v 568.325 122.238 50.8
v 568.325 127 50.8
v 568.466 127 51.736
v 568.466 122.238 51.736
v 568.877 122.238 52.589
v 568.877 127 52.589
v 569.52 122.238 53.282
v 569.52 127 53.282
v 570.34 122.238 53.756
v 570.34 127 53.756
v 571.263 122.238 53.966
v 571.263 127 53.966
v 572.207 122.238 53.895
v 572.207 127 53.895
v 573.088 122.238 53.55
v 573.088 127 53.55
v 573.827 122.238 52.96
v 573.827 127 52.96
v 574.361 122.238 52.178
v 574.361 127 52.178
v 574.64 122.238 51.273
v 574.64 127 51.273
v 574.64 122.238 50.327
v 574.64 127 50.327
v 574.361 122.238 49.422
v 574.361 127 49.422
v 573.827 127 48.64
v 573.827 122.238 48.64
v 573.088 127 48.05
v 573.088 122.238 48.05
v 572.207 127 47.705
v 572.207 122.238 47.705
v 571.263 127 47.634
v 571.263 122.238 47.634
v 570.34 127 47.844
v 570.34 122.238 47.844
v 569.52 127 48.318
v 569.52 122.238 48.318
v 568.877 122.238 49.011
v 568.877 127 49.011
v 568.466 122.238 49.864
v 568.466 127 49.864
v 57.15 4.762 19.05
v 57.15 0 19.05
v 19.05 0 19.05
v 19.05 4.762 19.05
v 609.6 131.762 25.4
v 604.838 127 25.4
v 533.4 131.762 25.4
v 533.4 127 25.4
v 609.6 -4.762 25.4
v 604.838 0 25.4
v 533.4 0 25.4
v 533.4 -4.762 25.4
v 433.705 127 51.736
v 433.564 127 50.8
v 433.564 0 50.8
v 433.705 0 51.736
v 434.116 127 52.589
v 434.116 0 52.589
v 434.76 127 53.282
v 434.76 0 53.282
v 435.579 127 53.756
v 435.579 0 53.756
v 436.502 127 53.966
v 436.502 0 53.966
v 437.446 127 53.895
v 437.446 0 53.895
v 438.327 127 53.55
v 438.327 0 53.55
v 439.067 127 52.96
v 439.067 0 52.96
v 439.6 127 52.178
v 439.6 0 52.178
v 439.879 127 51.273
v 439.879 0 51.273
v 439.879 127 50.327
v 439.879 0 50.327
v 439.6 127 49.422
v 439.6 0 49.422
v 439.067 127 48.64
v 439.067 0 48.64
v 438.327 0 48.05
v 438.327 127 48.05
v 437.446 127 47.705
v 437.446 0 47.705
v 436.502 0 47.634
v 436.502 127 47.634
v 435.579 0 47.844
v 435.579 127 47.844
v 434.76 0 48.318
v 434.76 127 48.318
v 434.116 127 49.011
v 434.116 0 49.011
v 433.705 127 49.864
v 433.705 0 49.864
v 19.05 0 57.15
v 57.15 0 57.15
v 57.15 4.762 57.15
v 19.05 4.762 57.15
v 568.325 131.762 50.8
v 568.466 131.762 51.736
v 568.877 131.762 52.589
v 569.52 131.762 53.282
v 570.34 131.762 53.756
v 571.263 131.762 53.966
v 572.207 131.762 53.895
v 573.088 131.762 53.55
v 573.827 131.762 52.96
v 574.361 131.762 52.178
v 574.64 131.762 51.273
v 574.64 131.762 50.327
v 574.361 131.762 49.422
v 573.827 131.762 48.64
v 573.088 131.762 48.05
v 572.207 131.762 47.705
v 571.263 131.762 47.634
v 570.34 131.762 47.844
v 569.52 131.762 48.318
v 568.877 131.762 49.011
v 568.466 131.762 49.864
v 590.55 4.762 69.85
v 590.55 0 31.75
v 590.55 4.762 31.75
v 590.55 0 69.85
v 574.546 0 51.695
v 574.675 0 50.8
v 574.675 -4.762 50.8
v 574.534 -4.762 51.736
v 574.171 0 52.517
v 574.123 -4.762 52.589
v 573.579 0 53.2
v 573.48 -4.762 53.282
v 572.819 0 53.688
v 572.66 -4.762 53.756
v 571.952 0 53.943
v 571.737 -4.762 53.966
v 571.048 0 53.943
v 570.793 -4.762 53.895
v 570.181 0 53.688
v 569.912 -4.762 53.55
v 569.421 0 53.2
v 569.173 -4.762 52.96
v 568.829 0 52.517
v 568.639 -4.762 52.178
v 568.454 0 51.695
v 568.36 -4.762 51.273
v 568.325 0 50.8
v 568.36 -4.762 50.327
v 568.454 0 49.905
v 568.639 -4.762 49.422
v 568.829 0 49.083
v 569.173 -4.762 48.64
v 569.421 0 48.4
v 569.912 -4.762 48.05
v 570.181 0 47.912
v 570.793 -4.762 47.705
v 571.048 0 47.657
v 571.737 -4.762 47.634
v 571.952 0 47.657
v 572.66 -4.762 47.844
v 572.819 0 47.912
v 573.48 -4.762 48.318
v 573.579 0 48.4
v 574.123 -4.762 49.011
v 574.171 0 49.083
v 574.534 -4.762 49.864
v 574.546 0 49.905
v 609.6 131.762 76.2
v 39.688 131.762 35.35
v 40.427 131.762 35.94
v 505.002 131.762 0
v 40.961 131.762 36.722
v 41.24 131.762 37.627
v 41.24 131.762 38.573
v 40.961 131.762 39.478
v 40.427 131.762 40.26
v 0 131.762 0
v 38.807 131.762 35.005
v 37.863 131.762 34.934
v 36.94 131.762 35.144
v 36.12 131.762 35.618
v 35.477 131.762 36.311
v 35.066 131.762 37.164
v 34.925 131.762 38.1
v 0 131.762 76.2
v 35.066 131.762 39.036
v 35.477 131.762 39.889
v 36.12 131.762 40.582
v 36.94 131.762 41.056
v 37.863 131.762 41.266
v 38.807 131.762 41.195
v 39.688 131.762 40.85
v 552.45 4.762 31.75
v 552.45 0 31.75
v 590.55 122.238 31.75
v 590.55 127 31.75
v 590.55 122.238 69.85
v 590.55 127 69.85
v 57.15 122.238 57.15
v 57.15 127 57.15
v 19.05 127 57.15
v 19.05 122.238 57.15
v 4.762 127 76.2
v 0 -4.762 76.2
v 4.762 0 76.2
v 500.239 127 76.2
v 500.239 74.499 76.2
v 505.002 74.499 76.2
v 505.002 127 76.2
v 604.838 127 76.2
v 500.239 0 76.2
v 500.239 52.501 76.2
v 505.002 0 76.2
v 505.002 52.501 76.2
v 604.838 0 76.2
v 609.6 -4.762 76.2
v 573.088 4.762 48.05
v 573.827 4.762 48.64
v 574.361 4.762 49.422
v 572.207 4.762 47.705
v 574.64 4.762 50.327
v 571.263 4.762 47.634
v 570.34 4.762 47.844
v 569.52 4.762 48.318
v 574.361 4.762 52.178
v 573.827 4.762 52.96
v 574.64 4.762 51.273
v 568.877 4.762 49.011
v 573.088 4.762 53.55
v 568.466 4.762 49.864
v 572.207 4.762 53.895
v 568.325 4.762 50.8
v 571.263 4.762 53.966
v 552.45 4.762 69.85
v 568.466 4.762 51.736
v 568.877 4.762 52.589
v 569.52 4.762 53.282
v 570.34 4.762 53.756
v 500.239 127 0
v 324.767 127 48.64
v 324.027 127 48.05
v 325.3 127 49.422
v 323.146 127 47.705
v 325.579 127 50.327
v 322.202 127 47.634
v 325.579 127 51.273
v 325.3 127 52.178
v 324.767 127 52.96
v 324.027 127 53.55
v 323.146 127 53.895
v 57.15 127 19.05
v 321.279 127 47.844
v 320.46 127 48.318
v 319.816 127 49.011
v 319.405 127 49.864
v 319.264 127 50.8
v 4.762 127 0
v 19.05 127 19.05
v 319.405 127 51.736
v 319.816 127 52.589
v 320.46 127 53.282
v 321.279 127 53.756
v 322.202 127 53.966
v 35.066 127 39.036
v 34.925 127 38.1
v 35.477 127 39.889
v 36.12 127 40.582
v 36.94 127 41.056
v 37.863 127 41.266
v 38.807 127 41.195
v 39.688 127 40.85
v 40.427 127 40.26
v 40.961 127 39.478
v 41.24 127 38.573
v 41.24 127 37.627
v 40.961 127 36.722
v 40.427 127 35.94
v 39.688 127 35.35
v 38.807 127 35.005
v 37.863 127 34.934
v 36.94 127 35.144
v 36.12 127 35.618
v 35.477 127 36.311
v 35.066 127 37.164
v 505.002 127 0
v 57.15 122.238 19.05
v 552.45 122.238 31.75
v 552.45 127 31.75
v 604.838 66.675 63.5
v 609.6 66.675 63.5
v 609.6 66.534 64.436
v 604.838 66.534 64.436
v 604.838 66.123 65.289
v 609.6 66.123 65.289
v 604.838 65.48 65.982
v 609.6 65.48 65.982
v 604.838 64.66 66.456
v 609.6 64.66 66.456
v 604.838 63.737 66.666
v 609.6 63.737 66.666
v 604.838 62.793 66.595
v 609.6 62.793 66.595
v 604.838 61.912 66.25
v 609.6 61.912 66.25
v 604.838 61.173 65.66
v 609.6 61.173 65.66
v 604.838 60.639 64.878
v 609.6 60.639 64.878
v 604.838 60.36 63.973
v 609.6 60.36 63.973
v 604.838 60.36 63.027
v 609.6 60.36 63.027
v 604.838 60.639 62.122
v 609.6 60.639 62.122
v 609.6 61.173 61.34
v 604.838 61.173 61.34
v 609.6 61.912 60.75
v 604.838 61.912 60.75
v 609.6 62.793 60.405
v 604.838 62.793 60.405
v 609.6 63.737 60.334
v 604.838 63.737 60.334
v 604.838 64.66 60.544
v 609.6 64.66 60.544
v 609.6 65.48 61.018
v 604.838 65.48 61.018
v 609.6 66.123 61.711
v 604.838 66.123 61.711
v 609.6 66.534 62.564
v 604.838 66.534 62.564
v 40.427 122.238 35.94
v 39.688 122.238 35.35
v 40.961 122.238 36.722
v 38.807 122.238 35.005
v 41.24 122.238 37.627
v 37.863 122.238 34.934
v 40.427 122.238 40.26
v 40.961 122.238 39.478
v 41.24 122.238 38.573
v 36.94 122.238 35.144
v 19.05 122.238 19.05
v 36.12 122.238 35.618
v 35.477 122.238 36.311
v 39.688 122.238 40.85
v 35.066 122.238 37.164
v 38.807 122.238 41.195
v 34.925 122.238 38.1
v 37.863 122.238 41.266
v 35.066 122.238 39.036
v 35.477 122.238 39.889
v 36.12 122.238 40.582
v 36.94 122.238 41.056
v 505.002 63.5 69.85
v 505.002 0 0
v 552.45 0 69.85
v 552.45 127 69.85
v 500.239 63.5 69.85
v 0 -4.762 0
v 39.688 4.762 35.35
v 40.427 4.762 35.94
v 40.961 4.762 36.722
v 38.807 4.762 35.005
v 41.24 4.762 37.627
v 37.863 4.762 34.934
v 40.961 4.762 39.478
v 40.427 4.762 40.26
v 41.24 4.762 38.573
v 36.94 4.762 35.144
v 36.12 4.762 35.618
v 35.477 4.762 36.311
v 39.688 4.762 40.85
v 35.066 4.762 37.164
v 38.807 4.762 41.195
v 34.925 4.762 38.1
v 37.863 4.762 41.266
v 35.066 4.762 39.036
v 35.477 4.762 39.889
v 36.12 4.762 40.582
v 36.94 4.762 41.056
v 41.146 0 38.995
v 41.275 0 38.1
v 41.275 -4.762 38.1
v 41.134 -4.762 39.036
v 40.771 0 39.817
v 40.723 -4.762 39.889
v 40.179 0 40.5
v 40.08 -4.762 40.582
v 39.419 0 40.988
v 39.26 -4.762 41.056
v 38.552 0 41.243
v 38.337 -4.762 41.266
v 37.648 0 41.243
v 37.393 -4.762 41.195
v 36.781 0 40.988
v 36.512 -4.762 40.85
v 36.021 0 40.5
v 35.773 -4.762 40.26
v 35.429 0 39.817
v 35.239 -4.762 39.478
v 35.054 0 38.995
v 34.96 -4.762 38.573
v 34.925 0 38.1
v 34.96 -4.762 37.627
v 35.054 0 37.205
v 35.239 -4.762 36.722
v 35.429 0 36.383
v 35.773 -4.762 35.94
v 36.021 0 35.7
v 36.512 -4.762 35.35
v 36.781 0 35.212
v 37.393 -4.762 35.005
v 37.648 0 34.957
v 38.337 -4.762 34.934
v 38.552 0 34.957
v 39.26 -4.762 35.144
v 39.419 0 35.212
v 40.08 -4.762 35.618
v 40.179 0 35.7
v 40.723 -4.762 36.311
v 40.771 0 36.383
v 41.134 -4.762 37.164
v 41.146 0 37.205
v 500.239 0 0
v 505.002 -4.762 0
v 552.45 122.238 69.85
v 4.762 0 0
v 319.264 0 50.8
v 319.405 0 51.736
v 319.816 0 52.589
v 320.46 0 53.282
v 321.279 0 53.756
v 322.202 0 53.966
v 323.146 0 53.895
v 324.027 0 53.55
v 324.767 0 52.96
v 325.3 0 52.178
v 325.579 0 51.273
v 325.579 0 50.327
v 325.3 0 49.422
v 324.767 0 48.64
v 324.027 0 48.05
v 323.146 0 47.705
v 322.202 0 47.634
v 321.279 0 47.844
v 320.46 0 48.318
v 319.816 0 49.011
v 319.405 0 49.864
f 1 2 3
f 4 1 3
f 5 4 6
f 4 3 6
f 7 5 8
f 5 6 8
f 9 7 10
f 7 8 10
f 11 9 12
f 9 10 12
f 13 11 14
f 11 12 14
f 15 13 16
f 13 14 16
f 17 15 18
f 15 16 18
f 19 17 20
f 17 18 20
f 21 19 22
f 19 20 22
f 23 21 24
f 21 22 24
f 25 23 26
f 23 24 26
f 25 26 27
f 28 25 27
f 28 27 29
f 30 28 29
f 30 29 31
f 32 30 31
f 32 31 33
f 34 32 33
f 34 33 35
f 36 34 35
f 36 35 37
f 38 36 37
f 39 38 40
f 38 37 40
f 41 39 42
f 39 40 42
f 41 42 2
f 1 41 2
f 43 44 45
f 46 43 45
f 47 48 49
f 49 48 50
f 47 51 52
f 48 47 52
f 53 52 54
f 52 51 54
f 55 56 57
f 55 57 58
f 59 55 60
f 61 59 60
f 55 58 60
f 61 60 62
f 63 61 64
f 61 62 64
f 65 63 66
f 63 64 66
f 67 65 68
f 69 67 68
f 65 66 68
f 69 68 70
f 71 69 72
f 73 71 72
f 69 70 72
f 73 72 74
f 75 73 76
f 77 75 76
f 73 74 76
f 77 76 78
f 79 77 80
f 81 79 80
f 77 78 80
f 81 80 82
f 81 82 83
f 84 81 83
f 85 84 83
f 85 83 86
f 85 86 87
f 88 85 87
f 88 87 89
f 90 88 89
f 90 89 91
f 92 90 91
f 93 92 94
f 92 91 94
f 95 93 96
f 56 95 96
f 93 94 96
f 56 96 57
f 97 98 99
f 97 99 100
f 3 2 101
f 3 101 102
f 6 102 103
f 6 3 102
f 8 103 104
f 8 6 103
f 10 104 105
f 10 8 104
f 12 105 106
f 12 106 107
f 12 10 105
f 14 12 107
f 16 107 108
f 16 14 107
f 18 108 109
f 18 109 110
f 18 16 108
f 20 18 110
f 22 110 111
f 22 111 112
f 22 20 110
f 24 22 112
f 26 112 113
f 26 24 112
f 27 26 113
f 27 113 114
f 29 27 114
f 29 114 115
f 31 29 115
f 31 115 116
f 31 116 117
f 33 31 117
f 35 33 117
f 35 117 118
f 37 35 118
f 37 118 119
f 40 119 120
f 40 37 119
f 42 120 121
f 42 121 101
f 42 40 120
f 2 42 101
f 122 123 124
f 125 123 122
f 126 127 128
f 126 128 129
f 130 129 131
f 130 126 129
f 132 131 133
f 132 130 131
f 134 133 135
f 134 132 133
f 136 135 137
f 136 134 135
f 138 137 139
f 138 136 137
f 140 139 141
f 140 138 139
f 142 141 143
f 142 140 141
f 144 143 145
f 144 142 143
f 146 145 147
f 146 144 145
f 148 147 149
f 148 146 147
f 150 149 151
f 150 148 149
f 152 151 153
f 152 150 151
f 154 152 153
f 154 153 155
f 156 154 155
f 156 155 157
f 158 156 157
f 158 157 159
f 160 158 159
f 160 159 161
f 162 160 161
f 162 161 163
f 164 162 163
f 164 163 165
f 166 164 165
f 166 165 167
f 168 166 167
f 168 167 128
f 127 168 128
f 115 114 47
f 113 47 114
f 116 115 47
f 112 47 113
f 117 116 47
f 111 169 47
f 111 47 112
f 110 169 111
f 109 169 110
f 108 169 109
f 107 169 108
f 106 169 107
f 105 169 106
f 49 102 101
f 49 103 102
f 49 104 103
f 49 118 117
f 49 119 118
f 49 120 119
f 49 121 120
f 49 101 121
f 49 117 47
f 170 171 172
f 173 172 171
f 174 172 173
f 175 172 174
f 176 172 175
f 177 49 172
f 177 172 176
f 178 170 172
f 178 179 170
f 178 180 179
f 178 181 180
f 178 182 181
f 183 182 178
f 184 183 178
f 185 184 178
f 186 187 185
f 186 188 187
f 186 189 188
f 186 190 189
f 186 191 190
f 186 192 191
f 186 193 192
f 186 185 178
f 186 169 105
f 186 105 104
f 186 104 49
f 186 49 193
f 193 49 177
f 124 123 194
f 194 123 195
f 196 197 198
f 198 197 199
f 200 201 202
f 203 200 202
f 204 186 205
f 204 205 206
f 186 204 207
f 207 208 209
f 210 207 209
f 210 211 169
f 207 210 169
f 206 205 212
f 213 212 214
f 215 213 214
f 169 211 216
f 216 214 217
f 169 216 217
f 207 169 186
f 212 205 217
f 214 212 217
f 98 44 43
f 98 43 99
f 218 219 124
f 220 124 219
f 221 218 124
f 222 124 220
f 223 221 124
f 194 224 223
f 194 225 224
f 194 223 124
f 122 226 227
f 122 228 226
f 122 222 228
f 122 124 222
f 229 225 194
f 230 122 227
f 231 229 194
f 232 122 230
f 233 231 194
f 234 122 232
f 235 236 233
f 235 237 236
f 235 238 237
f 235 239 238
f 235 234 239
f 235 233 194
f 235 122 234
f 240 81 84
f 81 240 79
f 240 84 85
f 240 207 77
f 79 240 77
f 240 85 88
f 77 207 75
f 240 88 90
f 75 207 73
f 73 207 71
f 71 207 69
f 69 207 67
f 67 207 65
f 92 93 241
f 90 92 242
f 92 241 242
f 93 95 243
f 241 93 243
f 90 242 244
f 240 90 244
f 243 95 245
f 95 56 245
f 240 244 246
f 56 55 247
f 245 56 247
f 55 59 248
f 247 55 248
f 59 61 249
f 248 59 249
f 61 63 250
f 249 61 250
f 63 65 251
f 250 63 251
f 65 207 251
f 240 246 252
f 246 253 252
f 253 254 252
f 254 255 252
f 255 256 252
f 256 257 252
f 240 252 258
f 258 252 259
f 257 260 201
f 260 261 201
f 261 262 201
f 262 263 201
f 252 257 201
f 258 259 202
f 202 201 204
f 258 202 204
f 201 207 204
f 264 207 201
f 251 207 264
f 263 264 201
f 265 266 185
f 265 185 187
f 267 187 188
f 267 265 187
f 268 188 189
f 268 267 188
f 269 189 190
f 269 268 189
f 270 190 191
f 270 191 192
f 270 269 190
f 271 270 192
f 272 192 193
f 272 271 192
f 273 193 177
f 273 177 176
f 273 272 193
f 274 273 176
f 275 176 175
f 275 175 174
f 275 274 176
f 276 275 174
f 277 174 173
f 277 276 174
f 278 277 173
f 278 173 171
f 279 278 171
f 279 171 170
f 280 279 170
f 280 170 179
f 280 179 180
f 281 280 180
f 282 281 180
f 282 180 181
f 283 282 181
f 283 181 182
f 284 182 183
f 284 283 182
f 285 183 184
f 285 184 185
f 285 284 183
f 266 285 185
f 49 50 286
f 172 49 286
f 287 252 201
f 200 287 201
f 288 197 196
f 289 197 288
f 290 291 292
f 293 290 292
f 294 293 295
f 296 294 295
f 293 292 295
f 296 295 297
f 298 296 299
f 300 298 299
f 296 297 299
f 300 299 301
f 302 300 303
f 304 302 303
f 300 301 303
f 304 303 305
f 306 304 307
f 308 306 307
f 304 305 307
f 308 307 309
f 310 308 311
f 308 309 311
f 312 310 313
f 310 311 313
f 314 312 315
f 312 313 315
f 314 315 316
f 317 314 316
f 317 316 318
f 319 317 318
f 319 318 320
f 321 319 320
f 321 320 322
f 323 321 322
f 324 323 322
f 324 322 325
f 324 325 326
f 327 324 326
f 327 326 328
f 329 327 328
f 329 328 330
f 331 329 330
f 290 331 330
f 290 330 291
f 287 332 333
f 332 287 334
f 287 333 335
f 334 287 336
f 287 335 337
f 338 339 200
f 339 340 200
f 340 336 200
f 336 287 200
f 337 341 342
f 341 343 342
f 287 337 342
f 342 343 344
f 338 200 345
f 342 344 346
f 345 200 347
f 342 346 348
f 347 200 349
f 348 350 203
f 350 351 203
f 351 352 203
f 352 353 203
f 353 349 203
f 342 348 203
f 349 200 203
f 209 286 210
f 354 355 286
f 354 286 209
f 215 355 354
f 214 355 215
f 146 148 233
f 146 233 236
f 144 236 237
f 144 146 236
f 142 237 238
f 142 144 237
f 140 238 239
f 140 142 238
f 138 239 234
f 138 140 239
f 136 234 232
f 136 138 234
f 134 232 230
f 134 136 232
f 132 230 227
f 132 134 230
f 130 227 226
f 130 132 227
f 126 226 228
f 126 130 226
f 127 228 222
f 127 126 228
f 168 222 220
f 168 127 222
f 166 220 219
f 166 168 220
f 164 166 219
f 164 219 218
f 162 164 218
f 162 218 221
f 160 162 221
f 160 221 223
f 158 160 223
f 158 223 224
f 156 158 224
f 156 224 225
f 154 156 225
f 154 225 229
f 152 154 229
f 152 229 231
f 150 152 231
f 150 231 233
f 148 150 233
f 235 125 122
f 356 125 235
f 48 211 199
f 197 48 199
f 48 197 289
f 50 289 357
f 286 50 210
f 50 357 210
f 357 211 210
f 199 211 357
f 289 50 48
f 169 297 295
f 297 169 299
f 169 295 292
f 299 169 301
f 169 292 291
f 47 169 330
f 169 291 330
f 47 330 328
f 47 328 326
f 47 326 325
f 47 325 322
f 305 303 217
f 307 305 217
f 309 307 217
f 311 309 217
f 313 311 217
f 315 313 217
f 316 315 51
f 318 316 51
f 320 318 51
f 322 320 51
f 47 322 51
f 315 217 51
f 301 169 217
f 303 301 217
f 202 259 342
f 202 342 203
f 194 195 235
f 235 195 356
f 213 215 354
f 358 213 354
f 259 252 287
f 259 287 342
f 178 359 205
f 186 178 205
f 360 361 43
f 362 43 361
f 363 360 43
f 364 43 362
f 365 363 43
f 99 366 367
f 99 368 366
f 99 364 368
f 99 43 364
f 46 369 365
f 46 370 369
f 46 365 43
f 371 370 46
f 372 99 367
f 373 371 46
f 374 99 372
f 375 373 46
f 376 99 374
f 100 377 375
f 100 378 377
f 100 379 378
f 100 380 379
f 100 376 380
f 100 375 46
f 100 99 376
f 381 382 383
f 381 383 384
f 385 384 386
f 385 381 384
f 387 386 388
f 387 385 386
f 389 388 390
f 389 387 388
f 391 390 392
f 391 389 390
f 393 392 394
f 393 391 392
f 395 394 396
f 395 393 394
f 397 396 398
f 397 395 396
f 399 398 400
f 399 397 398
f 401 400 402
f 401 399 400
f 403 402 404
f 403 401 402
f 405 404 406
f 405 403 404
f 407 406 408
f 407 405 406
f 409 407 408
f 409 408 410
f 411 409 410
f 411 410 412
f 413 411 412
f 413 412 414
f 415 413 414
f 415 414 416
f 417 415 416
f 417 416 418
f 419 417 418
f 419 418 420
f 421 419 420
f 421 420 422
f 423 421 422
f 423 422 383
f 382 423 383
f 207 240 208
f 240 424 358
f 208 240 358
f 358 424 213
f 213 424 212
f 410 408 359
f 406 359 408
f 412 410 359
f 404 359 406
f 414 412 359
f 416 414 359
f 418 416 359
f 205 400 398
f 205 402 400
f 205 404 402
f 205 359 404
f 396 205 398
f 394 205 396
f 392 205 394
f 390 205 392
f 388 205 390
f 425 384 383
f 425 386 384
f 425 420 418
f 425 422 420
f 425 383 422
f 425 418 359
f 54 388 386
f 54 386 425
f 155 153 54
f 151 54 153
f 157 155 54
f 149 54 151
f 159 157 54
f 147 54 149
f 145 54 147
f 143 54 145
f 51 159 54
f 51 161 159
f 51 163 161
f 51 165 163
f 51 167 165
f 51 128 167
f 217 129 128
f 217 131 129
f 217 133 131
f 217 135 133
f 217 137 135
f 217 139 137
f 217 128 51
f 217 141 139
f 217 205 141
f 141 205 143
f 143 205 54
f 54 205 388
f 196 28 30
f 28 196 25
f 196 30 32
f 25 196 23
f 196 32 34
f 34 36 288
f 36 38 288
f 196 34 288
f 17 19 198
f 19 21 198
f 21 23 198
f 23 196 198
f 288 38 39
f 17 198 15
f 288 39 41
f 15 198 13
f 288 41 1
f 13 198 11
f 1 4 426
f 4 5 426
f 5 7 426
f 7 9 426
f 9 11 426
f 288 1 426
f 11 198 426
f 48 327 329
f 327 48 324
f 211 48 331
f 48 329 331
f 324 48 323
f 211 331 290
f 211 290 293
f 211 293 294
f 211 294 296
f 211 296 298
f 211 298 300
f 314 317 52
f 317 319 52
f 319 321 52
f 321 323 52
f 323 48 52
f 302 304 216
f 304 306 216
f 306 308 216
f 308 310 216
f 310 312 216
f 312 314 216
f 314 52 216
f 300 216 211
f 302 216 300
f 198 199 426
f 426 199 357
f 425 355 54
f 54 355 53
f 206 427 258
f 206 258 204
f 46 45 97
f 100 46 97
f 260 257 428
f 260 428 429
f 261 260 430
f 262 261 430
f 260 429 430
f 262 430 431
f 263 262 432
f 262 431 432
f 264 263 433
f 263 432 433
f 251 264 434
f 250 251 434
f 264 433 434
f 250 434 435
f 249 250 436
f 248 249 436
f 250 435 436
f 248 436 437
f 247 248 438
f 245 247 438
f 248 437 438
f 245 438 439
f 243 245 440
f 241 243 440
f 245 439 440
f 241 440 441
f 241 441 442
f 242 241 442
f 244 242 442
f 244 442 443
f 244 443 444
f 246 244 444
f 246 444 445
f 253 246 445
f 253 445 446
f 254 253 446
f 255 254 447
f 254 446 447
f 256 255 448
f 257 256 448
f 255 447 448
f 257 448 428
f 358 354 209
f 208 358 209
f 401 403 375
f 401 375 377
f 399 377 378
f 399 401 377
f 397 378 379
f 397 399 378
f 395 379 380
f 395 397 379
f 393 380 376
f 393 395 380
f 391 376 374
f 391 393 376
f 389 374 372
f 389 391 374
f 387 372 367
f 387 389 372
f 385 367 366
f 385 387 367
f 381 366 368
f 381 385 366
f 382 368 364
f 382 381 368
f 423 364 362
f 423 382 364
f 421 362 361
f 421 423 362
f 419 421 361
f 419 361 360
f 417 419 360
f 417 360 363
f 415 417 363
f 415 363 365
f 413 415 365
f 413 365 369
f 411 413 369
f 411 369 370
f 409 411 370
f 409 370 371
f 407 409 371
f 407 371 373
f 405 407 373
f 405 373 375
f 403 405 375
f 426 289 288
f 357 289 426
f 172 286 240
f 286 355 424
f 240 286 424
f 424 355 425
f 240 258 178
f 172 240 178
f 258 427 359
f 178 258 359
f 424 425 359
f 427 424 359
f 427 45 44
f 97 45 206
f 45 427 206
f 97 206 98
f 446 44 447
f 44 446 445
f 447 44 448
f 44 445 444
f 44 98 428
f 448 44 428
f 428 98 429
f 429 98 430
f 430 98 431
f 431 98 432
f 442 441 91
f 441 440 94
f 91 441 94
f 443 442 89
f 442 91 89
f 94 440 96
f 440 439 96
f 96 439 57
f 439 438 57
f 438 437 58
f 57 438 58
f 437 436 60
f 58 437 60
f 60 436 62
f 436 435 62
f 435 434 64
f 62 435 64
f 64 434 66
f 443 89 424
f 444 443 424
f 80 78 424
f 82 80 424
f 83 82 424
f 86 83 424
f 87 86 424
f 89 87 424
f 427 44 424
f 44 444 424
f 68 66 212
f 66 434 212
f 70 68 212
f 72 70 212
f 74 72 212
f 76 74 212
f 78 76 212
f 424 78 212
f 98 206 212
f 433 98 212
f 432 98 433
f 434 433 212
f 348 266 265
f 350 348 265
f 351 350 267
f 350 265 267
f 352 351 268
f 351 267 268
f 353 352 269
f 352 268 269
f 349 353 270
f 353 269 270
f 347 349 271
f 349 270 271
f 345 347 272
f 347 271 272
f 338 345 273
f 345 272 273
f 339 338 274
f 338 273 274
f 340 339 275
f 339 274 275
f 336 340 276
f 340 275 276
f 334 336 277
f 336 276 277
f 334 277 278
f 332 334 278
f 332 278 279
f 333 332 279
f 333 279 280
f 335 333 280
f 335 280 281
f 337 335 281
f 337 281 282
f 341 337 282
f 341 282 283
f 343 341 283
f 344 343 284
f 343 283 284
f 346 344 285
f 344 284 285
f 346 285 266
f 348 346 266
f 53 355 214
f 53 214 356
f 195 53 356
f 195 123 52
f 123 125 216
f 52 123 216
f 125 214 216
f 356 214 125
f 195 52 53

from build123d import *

# Parameters (mm, degrees)
F0_R      = 3.175
F1_DEPTH  = 4.7625
F2_W      = 4.7625
F2_H      = 50.8
F2_H_2    = 76.2
F2_R      = 3.175
F3_DEPTH  = 127
F4_R      = 3.175
F5_DEPTH  = 4.7625
F6_R      = 3.175
F7_DEPTH  = 25.4
F9_DEPTH  = 25.4
F10_W     = 38.1
F10_H     = 38.1
F10_R     = 3.175
F11_DEPTH = 4.7625
F12_W     = 38.1
F12_H     = 38.1
F12_R     = 3.175
F13_DEPTH = 4.7625
F14_W     = 38.1
F14_H     = 38.1
F14_R     = 3.175
F15_DEPTH = 4.7625
F16_W     = 38.1
F16_H     = 38.1
F16_R     = 3.175
F17_DEPTH = 4.7625


# Not quite as in the source:
# - a length typed as a fraction of an inch, garbled in the dataset ("3 / 203.2 mm" for 3/8 in), is restored


with BuildPart() as f1:
    # F0 (on Front) → F1 (new body)
    with BuildSketch(Plane.XZ):
        Polygon((0, 76.2), (0, 0), (505.0019366858, 0), (533.4, 25.4), (609.6, 25.4), (609.6, 76.2), align=None)
        with Locations((38.1, 38.1)):
            Circle(F0_R, mode=Mode.SUBTRACT)
        with Locations((571.5, 50.8)):
            Circle(F0_R, mode=Mode.SUBTRACT)
    extrude(amount=F1_DEPTH)

    # F2 (on face) → F3 (join)
    with BuildSketch(Plane(origin=(0, 0, 0), x_dir=(-1, 0, 0), z_dir=(0, 1, 0))):
        with Locations((-607.21875, 50.8)):
            Rectangle(F2_W, F2_H)
        with Locations((-502.6206866858, 38.1)):
            Rectangle(F2_W, F2_H_2)
        with Locations((-436.7394366858, 50.8)):
            Circle(F2_R)
        with Locations((-322.4394366858, 50.8)):
            Circle(F2_R)
        with Locations((-2.38125, 38.1)):
            Rectangle(F2_W, F2_H_2)
    extrude(amount=F3_DEPTH)

    # F4 (on face) → F5 (join)
    with BuildSketch(Plane(origin=(0, 127, 0), x_dir=(-1, 0, 0), z_dir=(0, 1, 0))):
        Polygon((0, 76.2), (-609.6, 76.2), (-609.6, 25.4), (-533.4, 25.4), (-505.0019366858, 0), (0, 0), align=None)
        with Locations((-571.5, 50.8)):
            Circle(F4_R, mode=Mode.SUBTRACT)
        with Locations((-38.1, 38.1)):
            Circle(F4_R, mode=Mode.SUBTRACT)
    extrude(amount=F5_DEPTH)

    # F6 (on face) → F7 (cut)
    with BuildSketch(Plane.YZ.offset(609.6)):
        with Locations((63.5, 63.5)):
            Circle(F6_R)
    extrude(amount=-F7_DEPTH, mode=Mode.SUBTRACT)

    # F8 (on face) → F9 (cut)
    with BuildSketch(Plane.YZ.offset(505.0019366858)):
        Polygon((74.4985226281, 76.2), (63.5, 76.2), (63.5, 69.85), align=None)
        Polygon((63.5, 69.85), (63.5, 76.2), (52.5014773719, 76.2), align=None)
    extrude(amount=-F9_DEPTH, mode=Mode.SUBTRACT)

    # F10 (on face) → F11 (join)
    with BuildSketch(Plane(origin=(0, 0, 0), x_dir=(-1, 0, 0), z_dir=(0, 1, 0))):
        with Locations((-38.1, 38.1)):
            Rectangle(F10_W, F10_H)
        with Locations((-38.1, 38.1)):
            Circle(F10_R, mode=Mode.SUBTRACT)
    extrude(amount=F11_DEPTH)

    # F12 (on face) → F13 (join)
    with BuildSketch(Plane(origin=(0, 0, 0), x_dir=(-1, 0, 0), z_dir=(0, 1, 0))):
        with Locations((-571.5, 50.8)):
            Rectangle(F12_W, F12_H)
        with Locations((-571.5, 50.8)):
            Circle(F12_R, mode=Mode.SUBTRACT)
    extrude(amount=F13_DEPTH)

    # F14 (on face) → F15 (join)
    with BuildSketch(Plane(origin=(0, 127, 0), x_dir=(-1, 0, 0), z_dir=(0, 1, 0))):
        with Locations((-38.1, 38.1)):
            Rectangle(F14_W, F14_H)
        with Locations((-38.1, 38.1)):
            Circle(F14_R, mode=Mode.SUBTRACT)
    extrude(amount=-F15_DEPTH)

    # F16 (on face) → F17 (join)
    with BuildSketch(Plane(origin=(0, 127, 0), x_dir=(-1, 0, 0), z_dir=(0, 1, 0))):
        with Locations((-571.5, 50.8)):
            Rectangle(F16_W, F16_H)
        with Locations((-571.5, 50.8)):
            Circle(F16_R, mode=Mode.SUBTRACT)
    extrude(amount=-F17_DEPTH)


solid = f1.part
